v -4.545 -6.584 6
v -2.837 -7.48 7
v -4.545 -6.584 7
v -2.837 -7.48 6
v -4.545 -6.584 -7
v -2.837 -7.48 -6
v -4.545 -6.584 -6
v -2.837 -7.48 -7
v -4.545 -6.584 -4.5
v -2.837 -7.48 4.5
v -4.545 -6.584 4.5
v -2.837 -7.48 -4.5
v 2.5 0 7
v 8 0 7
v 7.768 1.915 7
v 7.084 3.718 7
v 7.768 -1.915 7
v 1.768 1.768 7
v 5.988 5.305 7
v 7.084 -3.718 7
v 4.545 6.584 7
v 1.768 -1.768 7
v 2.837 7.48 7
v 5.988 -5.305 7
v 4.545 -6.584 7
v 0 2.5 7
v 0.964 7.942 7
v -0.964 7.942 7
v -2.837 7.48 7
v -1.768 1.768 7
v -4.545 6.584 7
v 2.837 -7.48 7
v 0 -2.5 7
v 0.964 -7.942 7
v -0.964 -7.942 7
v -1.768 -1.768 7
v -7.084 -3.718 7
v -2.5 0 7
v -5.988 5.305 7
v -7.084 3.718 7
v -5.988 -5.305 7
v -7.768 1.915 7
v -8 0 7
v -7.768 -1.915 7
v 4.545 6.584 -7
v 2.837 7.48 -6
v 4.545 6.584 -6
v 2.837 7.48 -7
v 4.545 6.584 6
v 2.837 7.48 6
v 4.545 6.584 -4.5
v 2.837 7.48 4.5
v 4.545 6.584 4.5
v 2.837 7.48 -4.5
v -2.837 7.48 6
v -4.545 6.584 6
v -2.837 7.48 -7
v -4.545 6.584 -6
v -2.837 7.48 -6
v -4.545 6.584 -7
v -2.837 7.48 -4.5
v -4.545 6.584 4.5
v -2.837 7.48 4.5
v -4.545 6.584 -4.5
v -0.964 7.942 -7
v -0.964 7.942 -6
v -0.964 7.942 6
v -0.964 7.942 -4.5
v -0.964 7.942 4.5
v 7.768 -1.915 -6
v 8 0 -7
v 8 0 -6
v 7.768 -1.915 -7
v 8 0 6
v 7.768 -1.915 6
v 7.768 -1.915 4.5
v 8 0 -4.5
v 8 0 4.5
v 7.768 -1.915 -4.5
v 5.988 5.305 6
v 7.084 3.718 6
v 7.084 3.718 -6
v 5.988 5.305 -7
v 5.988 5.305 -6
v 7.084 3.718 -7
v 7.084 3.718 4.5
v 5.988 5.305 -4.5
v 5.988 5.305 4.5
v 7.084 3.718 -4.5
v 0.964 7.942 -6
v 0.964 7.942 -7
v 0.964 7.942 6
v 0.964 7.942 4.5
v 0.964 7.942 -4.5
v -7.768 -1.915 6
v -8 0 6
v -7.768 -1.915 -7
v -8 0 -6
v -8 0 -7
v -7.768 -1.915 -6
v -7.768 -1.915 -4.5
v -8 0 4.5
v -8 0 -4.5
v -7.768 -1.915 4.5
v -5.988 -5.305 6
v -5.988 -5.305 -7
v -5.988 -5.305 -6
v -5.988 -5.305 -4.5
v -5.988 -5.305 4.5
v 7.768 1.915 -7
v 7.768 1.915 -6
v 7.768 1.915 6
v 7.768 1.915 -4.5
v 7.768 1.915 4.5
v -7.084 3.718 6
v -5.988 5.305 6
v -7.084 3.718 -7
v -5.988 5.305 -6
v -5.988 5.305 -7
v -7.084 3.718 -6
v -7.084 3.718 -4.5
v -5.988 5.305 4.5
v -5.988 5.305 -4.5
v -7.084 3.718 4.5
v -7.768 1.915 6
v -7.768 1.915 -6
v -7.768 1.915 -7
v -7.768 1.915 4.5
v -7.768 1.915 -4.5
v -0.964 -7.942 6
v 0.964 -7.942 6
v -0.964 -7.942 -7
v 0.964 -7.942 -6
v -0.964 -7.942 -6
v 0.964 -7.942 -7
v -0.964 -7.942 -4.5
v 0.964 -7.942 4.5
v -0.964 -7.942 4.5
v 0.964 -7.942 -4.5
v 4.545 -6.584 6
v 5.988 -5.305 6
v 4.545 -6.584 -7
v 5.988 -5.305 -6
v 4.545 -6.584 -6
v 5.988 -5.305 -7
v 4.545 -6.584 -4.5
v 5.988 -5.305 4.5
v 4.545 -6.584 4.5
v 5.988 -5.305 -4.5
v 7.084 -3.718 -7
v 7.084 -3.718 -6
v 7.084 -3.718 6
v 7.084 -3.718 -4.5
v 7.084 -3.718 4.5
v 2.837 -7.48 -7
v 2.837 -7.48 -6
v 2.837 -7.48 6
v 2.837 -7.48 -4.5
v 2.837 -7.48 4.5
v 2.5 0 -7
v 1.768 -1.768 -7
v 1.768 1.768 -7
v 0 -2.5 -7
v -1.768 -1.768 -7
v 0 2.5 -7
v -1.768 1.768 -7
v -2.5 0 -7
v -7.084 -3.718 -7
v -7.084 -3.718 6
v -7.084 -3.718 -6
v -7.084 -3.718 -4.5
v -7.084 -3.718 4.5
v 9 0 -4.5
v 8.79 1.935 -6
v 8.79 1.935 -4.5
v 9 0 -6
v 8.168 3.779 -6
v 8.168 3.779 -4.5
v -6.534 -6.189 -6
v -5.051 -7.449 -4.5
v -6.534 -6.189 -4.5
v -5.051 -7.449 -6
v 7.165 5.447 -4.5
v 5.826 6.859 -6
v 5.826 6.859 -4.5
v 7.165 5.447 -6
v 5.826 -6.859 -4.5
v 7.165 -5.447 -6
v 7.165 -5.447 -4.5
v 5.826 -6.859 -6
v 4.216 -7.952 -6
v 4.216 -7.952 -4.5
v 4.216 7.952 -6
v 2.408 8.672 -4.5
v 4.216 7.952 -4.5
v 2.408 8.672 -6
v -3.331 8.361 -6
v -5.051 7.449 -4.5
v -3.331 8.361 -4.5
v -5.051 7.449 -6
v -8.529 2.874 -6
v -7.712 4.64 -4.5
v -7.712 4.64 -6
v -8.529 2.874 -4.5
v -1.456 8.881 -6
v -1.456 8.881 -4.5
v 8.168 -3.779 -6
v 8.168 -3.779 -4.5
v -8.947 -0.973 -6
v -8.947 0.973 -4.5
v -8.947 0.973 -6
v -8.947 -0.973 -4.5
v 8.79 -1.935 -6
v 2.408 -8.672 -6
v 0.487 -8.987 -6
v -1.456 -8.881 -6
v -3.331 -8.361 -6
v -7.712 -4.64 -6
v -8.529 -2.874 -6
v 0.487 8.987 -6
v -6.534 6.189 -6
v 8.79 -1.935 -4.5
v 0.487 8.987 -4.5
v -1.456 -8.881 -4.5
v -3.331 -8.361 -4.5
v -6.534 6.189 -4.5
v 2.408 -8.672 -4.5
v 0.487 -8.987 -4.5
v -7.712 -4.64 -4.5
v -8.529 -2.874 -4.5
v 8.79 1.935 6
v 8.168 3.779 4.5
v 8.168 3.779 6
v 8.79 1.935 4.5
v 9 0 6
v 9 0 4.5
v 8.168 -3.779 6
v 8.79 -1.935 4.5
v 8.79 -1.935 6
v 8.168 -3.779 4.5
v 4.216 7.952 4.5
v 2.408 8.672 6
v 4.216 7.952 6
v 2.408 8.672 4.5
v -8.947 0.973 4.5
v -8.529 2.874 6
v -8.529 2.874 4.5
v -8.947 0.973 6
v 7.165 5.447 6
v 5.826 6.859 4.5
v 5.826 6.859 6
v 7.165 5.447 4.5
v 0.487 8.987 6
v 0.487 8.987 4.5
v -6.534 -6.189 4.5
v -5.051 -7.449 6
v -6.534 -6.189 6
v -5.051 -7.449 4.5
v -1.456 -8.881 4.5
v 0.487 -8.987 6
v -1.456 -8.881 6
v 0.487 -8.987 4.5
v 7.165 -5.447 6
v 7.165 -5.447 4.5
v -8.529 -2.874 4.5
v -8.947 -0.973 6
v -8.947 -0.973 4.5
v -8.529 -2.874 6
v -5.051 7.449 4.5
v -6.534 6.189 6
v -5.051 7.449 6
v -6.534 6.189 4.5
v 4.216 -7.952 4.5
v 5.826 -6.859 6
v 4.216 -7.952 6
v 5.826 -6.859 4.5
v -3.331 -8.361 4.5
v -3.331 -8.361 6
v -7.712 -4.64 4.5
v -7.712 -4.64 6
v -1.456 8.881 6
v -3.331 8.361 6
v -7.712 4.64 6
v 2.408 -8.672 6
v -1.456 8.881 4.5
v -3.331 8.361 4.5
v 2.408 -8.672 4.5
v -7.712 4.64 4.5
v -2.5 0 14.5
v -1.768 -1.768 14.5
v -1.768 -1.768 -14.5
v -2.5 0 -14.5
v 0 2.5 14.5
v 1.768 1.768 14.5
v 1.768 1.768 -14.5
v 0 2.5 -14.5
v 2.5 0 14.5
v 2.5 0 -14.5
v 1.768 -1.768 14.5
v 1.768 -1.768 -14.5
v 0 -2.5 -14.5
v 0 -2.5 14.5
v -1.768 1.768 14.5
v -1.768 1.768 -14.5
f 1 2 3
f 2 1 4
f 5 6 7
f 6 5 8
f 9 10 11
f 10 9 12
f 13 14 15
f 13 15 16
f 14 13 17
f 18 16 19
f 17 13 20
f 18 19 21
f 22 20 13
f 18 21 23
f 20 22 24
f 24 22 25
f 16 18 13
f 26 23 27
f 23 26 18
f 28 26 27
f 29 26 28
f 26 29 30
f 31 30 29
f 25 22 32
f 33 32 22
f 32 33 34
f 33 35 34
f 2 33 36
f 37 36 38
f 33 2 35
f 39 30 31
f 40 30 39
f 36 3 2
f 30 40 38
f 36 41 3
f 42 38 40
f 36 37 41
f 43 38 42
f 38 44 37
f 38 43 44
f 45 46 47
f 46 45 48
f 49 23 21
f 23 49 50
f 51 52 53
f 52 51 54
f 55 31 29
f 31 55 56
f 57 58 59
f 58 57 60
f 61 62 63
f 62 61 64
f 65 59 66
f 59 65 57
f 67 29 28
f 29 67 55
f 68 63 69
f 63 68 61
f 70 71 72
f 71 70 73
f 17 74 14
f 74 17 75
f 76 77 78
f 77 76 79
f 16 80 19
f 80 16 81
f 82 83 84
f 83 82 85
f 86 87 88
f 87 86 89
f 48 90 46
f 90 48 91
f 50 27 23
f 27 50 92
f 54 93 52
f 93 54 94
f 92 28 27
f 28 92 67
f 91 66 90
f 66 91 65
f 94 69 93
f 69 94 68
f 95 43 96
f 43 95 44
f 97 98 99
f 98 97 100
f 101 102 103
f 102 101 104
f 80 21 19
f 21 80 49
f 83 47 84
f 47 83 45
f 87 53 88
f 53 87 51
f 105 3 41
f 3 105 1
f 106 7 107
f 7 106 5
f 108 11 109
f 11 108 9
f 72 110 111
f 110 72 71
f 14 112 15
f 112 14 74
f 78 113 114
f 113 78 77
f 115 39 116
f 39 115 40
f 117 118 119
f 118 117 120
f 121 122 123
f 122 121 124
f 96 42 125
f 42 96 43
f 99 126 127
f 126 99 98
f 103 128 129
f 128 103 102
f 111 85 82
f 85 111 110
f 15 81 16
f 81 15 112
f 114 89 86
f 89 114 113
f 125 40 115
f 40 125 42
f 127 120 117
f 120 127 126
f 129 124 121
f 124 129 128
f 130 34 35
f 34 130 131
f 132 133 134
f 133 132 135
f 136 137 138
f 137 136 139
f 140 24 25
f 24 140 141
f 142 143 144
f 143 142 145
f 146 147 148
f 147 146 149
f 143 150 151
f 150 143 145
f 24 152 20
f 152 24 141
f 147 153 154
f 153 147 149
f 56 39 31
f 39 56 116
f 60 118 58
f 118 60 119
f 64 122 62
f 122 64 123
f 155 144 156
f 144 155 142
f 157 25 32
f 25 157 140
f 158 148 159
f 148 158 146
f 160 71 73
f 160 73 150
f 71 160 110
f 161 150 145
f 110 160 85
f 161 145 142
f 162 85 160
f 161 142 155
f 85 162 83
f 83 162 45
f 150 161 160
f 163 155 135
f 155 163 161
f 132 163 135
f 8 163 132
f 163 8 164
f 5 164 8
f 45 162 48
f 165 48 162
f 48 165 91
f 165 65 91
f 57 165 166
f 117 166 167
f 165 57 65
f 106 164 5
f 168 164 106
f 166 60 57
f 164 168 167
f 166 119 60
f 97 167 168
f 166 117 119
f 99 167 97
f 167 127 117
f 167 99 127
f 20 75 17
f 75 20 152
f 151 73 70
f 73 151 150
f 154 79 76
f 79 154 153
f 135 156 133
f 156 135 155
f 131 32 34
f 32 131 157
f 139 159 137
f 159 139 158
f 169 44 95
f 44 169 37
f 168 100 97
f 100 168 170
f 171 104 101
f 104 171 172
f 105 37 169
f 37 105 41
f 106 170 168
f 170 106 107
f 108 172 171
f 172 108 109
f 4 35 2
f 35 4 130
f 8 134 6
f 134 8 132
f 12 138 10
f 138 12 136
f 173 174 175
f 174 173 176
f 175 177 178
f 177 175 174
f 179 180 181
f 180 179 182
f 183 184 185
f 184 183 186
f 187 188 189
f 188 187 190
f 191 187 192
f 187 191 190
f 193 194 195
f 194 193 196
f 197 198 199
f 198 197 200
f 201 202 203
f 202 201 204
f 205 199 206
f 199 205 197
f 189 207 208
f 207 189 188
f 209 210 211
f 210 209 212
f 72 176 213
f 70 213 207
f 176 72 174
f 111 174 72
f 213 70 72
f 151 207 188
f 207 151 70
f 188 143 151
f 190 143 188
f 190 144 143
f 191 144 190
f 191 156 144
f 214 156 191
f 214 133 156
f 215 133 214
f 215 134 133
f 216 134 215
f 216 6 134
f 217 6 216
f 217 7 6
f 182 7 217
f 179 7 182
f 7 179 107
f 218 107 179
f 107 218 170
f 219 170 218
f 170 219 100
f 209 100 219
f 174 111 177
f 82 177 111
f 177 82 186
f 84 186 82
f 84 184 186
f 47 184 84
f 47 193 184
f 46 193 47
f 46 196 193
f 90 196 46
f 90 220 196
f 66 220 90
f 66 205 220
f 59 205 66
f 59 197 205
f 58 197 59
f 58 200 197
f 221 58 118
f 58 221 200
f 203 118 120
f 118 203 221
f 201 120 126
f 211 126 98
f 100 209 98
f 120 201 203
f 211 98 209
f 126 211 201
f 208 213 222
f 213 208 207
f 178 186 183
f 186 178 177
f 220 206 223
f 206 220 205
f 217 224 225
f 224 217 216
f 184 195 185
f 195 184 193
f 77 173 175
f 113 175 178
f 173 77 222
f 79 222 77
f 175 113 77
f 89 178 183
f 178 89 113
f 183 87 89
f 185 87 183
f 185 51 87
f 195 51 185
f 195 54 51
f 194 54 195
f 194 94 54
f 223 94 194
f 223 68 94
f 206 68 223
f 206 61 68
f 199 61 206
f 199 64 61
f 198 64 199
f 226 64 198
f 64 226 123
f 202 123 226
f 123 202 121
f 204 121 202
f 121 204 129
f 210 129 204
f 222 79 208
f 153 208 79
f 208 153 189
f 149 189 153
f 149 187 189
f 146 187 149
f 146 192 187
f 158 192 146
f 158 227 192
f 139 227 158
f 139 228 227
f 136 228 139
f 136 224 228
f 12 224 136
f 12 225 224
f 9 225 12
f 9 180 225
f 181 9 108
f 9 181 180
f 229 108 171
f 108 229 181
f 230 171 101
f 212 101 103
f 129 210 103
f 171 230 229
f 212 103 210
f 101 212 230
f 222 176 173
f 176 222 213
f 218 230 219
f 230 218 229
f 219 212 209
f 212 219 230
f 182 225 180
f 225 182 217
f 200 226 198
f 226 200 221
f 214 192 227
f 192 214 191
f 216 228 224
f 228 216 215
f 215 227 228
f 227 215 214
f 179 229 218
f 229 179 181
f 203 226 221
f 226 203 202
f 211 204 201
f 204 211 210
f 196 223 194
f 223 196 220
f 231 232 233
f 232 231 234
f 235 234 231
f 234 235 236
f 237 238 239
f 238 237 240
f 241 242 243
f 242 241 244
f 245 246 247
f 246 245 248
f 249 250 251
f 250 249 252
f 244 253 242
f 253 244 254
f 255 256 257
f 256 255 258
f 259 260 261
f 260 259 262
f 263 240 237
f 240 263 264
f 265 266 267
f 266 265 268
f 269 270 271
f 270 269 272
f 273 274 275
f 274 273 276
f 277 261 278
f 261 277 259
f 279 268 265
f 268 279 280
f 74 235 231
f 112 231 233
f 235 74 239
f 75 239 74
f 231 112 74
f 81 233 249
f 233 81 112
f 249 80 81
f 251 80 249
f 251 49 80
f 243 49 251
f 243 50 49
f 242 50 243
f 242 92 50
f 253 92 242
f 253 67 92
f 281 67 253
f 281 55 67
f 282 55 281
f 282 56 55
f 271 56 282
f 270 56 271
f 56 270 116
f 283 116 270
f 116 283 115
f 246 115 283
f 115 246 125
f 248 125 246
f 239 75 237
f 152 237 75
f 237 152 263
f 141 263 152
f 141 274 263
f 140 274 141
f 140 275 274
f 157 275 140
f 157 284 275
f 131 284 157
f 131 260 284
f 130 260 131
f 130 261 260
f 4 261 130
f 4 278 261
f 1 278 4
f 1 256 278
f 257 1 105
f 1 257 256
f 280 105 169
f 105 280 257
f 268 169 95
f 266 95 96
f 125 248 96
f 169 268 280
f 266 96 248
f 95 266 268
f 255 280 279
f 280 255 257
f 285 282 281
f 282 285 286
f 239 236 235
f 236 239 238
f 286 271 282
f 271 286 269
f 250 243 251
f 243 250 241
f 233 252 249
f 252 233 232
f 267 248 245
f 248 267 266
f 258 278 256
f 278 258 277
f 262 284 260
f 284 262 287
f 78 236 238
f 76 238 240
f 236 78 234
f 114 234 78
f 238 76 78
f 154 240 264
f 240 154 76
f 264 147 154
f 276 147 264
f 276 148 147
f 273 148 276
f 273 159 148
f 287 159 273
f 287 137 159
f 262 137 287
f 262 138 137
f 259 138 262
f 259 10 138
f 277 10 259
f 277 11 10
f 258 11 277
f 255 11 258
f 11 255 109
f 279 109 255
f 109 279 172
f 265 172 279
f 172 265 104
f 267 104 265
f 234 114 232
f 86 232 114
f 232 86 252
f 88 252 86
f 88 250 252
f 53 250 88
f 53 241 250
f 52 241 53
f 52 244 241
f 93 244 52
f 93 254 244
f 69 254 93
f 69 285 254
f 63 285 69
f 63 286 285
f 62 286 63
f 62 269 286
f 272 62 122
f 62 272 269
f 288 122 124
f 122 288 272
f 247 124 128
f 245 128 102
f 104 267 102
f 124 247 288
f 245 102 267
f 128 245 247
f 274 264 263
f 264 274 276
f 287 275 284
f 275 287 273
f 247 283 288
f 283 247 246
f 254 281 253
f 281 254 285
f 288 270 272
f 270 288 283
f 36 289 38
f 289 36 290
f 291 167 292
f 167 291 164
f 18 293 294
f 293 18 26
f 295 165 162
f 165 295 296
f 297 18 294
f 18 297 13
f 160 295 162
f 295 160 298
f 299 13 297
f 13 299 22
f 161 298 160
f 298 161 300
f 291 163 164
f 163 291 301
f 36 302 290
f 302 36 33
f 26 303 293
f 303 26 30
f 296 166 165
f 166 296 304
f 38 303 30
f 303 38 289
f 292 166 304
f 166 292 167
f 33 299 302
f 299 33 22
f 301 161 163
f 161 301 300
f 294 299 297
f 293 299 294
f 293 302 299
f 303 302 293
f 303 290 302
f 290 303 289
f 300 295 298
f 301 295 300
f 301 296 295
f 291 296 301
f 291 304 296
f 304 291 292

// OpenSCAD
// Parameters
tooth_count = 20; //[10:60:1]
pitch_diameter_mm = 12.22; //[6.11:24.44:0.01]
pitch_radius_mm = 6.11; //[3.055:12.22:0.01]
belt_pitch_mm = 2; //[1:10:0.01]
pulley_width_mm = 10; //[5:30:0.1]
tooth_depth_mm = 0.8; //[0.3:2:0.01]
tooth_width_mm = 1.5; //[0.8:3:0.01]
root_clearance_mm = 0.4; //[0.1:1.5:0.01]
bore_diameter_mm = 5; //[2:10:0.01]
hub_diameter_mm = 16; //[8:32:0.1]
hub_length_mm = 14; //[6:40:0.1]
flange_diameter_mm = 18; //[10:40:0.1]
flange_thickness_mm = 1.5; //[0.8:5:0.1]
tolerance_mm = 0; //[0:0.5:0.01]
overlap_mm = 1; //[0.5:2:0.1]
pitch_circle_ref_thickness_mm = 0.6; //[0.2:2:0.1]

// Pulley - complete geometry
module pulley() {
  color("Silver") {
    // Toothed pulley body
    cylinder(r=pitch_radius_mm - root_clearance_mm, h=pulley_width_mm, center=true);

    // Hub
    translate([0, 0, 0])
      cylinder(r=hub_diameter_mm/2, h=hub_length_mm, center=true);

    // Flanges
    translate([0, 0, -pulley_width_mm/2 - flange_thickness_mm/2 + overlap_mm/2])
      cylinder(r=flange_diameter_mm/2, h=flange_thickness_mm, center=true);
    translate([0, 0, pulley_width_mm/2 + flange_thickness_mm/2 - overlap_mm/2])
      cylinder(r=flange_diameter_mm/2, h=flange_thickness_mm, center=true);

    // Bore hole
    translate([0, 0, 0])
      cylinder(r=(bore_diameter_mm + tolerance_mm)/2, h=hub_length_mm + pulley_width_mm + 2*flange_thickness_mm + 2*overlap_mm, center=true);
  }
}

// Printed Pulley Teeth - complete geometry
module printed_pulley_teeth() {
  color("DimGray") {
    for (i = [0:tooth_count-1]) {
      rotate([0, 0, i*360/tooth_count])
        translate([pitch_radius_mm - root_clearance_mm + tooth_depth_mm/2 - overlap_mm, 0, 0])
        cube([tooth_depth_mm, tooth_width_mm, pulley_width_mm], center=true);
    }
  }
}

// Printed Pulley GT2 Teeth - complete geometry
module printed_pulley_GT2_teeth() {
  printed_pulley_teeth();
}

// Printed Pulley Teeth From Profile - complete geometry
module printed_pulley_teeth_from_profile() {
  printed_pulley_GT2_teeth();
}

// Assembly
module assembly() {
  pulley();
  printed_pulley_teeth_from_profile();
}

assembly();
